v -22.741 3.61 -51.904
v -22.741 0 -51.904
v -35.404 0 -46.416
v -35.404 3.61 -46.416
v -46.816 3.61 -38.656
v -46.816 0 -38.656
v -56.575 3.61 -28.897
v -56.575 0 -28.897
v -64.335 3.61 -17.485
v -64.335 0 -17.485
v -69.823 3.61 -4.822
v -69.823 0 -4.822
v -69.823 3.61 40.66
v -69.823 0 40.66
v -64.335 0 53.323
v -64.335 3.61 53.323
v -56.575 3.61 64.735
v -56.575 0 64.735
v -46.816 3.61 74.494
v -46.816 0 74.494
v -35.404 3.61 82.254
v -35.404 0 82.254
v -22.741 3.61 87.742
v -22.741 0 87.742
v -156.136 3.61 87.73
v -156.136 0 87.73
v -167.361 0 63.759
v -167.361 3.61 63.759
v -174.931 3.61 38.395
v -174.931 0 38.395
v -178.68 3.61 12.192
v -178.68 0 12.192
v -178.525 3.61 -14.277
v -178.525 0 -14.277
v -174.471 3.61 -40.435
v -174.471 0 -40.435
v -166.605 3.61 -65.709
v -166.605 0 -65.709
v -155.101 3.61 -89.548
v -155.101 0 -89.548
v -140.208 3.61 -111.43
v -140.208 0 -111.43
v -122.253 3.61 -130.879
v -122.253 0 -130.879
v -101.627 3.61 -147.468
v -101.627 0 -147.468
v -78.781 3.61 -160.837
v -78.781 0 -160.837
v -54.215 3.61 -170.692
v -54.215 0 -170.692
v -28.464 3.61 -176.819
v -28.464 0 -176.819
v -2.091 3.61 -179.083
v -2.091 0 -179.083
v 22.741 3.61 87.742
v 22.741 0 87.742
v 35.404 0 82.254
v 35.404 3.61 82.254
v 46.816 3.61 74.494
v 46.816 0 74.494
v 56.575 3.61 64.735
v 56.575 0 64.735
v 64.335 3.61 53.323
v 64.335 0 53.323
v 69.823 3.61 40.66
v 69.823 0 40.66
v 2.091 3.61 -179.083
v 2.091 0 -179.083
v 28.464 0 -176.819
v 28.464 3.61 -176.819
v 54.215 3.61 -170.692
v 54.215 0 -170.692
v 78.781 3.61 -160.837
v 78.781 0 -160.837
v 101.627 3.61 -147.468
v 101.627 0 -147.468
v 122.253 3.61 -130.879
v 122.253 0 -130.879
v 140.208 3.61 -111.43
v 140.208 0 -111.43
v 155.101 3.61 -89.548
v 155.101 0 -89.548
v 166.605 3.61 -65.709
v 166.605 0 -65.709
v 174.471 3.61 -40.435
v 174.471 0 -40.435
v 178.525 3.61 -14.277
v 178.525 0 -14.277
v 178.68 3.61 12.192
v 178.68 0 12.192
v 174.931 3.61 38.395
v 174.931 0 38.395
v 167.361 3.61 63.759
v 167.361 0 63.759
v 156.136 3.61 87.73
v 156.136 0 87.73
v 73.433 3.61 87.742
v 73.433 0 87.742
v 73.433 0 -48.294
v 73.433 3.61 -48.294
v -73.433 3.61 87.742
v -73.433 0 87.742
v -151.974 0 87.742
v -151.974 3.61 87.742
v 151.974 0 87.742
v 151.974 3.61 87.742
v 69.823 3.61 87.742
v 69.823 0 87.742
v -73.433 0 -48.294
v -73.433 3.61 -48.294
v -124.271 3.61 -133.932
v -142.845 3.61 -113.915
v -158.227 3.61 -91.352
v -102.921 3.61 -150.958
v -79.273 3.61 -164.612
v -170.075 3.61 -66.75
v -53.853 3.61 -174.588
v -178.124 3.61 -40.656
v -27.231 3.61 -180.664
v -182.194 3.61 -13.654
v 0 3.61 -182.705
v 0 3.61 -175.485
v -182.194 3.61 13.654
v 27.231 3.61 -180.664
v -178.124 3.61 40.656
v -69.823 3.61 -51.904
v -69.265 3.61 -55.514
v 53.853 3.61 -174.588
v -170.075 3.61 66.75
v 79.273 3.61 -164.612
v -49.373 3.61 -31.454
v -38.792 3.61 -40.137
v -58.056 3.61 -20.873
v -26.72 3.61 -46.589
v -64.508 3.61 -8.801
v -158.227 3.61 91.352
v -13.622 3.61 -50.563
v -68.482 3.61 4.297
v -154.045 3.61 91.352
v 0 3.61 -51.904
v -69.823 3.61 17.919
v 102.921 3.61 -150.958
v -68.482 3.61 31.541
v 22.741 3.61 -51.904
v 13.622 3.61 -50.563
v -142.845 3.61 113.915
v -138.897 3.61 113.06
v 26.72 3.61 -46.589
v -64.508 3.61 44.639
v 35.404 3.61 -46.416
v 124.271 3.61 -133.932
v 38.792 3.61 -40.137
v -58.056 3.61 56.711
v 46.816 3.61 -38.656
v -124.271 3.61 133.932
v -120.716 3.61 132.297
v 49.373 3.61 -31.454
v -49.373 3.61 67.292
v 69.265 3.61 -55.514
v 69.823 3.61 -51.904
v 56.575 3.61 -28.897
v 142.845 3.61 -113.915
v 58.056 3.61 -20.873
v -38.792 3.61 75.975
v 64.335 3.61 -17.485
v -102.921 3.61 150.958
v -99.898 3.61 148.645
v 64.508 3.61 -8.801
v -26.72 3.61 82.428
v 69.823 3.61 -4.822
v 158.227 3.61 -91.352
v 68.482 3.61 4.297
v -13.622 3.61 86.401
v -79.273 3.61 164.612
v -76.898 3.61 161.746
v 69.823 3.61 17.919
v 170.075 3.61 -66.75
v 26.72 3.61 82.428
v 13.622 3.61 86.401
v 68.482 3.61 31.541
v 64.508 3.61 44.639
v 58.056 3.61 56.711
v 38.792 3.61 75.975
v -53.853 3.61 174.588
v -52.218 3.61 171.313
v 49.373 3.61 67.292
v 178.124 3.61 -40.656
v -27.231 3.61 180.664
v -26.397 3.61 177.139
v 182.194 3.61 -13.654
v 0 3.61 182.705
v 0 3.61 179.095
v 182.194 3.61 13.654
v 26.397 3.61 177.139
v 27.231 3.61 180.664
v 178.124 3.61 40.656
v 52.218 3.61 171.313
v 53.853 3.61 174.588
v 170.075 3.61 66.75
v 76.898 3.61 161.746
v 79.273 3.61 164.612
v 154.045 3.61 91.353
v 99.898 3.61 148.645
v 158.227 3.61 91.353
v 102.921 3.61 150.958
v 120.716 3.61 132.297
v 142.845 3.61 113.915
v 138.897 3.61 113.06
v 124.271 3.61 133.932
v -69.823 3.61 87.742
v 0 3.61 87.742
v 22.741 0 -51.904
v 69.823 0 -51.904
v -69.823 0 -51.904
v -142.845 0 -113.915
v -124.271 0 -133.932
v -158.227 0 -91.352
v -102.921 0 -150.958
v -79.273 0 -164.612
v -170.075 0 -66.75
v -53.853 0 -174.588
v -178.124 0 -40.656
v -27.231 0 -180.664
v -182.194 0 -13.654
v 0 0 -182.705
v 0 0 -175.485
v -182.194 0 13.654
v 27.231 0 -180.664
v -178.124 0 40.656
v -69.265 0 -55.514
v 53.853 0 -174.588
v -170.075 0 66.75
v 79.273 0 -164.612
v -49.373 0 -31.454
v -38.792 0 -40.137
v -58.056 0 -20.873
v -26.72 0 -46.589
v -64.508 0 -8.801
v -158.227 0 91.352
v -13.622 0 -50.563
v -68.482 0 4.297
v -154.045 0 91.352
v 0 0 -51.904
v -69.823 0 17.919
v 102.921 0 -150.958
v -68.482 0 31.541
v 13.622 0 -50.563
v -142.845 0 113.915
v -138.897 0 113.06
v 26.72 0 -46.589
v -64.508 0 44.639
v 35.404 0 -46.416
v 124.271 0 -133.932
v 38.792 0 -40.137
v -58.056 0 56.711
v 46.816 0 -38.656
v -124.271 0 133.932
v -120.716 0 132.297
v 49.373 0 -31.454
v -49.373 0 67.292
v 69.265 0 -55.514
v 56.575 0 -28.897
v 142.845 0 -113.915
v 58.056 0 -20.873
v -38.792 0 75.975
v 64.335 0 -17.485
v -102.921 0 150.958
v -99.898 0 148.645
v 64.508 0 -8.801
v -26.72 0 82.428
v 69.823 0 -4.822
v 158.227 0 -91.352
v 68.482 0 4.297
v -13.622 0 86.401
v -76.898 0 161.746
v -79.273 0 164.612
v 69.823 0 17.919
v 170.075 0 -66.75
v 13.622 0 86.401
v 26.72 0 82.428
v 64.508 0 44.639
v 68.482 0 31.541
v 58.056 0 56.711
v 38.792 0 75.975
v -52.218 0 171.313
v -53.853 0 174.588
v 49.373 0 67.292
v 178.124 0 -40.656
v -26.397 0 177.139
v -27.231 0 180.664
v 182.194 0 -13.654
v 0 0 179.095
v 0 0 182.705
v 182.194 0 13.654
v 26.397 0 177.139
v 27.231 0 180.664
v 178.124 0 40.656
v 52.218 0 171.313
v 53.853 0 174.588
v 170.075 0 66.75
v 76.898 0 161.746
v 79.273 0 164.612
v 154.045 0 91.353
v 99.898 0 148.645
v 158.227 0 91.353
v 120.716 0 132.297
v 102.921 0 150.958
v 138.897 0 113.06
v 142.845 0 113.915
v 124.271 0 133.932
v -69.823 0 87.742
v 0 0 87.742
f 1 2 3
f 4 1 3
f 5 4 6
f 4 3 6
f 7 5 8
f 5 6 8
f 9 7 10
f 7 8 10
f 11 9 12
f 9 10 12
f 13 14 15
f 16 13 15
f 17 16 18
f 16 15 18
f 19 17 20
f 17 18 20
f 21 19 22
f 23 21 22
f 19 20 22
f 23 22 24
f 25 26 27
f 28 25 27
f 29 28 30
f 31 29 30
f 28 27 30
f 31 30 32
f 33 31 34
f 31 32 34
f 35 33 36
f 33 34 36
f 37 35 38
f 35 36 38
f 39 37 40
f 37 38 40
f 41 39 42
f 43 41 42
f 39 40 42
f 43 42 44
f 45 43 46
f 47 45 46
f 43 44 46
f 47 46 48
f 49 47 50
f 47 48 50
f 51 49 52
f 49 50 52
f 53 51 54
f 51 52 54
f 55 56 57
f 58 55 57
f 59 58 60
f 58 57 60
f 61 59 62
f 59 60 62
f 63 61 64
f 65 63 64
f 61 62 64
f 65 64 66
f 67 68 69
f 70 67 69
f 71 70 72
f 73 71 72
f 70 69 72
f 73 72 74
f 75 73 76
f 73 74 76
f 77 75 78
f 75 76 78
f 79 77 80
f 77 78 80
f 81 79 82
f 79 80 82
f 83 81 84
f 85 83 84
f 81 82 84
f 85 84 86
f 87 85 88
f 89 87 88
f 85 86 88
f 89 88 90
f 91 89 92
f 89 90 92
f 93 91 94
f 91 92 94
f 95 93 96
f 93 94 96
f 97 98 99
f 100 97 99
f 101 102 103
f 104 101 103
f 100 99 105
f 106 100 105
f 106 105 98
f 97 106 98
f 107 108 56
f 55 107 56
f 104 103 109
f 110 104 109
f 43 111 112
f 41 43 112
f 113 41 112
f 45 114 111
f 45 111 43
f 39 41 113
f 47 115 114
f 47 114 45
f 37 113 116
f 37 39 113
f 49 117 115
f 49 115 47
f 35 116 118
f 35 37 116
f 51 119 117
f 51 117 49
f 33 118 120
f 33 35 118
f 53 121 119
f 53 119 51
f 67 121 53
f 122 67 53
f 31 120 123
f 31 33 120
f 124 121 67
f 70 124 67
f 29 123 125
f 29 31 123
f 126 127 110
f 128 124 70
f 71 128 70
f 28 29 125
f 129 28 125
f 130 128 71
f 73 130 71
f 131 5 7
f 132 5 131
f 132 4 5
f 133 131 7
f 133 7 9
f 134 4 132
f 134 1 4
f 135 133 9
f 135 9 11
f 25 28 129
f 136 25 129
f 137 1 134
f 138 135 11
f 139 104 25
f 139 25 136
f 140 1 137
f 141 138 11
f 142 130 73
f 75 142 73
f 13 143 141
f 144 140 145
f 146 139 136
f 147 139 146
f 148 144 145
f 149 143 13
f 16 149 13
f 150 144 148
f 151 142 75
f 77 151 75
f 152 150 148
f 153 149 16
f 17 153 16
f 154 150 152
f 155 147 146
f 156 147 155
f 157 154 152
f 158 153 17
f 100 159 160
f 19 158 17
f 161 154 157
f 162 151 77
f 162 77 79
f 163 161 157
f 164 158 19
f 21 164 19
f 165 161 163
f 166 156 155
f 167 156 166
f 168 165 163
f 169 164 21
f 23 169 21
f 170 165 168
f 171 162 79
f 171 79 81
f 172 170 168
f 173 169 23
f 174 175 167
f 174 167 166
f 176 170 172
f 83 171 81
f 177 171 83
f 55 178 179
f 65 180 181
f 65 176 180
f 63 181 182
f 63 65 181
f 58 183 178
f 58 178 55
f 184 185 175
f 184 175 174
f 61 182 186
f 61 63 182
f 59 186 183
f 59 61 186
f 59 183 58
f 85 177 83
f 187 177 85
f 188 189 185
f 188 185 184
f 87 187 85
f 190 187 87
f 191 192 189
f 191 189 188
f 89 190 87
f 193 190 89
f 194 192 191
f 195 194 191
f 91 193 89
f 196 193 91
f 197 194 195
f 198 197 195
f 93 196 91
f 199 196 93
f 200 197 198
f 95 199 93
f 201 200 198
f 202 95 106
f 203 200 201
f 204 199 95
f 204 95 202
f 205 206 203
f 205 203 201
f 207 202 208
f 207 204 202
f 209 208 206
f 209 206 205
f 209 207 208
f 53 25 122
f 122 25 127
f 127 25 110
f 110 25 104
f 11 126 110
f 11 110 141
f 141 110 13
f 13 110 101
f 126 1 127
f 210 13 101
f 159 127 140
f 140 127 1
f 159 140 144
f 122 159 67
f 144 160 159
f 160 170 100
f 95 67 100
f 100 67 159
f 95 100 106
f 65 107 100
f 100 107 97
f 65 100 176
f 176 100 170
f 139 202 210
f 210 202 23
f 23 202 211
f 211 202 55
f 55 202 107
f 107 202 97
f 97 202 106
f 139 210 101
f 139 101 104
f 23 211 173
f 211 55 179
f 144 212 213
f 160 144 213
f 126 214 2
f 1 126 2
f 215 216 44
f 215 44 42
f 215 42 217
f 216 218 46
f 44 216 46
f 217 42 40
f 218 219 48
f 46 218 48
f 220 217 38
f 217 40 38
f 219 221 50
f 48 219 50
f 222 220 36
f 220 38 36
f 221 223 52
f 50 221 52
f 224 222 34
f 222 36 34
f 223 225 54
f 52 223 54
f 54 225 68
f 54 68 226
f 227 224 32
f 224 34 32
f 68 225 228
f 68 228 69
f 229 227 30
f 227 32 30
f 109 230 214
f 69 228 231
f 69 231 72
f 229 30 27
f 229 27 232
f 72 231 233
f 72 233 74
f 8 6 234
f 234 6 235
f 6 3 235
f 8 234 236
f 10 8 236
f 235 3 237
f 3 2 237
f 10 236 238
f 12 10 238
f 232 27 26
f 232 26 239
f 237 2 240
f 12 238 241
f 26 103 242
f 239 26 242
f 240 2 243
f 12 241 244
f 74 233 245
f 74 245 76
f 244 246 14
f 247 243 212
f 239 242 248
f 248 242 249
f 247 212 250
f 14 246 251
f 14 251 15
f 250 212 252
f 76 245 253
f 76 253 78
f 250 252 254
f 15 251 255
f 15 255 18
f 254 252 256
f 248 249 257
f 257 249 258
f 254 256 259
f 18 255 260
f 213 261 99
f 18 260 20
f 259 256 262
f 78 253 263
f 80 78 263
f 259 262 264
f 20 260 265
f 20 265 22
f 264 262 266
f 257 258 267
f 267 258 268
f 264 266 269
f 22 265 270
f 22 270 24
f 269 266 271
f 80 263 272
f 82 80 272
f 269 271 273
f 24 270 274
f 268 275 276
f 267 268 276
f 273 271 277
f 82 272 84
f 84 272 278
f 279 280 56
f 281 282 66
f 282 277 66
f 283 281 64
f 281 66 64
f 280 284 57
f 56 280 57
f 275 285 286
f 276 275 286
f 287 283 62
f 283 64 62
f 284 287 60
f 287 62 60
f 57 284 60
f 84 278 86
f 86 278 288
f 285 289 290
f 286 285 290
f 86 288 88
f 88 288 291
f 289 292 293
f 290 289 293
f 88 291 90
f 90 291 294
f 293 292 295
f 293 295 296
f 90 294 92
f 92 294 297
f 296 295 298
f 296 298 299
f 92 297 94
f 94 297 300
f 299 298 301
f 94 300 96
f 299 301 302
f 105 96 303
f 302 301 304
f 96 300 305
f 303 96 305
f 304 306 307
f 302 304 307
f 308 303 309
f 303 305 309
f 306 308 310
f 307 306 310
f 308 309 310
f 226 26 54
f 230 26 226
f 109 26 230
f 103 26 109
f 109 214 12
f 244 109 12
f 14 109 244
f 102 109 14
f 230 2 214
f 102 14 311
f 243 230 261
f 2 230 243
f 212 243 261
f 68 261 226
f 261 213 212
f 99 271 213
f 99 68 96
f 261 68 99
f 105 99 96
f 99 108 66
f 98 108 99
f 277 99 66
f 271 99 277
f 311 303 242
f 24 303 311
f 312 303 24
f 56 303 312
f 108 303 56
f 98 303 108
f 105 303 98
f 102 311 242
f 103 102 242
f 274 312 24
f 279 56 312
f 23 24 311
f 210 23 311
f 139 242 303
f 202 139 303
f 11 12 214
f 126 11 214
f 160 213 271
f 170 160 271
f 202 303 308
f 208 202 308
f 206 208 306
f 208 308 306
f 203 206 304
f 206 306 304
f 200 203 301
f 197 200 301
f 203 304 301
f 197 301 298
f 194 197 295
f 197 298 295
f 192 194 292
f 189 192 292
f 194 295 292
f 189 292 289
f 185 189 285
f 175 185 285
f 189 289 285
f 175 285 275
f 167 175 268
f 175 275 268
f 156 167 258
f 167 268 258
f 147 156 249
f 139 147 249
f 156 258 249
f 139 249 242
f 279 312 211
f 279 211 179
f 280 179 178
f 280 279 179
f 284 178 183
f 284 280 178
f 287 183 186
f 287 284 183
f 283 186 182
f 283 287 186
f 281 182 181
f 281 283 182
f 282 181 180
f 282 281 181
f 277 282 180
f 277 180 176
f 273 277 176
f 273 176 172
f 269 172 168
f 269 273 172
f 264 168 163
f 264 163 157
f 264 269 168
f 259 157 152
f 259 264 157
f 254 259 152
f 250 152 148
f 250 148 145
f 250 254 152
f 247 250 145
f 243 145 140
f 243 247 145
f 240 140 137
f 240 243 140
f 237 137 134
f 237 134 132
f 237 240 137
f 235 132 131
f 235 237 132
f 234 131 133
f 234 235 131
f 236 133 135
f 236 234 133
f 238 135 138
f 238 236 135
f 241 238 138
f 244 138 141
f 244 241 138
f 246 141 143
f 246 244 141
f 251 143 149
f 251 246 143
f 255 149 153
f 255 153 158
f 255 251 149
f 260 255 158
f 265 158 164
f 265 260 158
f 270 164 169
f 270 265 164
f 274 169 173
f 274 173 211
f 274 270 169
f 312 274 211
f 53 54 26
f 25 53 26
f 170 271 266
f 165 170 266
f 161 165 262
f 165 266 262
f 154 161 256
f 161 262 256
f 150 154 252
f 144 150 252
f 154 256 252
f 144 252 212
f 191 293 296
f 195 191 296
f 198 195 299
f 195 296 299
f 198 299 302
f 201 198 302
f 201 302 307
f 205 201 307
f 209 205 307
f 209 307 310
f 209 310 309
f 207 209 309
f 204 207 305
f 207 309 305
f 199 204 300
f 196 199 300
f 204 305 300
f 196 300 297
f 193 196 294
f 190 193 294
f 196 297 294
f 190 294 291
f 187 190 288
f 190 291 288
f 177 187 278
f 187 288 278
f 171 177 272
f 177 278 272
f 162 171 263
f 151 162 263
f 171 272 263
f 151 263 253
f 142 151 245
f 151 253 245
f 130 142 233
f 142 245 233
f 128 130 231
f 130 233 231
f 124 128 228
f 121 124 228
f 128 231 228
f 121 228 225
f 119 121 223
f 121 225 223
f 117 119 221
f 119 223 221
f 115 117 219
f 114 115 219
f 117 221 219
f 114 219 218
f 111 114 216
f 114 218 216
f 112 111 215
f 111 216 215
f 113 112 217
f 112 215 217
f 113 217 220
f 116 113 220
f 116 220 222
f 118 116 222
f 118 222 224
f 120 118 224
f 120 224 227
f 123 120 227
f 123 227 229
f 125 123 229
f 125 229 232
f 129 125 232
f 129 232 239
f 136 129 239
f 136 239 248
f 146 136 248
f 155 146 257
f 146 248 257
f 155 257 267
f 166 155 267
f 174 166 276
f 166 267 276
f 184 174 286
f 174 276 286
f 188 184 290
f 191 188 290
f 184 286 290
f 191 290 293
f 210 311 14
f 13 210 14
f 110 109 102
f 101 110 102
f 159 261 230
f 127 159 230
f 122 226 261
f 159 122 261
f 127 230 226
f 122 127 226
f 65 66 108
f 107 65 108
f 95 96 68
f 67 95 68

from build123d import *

# Parameters (mm, degrees)
SKETCH1_R           = 182.705
SKETCH1_R_2         = 69.823485805
BOSS_EXTRUDE4_DEPTH = 3.61


with BuildPart() as part:
    # Sketch1 → Boss-Extrude4 (new body)
    with BuildSketch(Plane(origin=(0, 0, 0), x_dir=(1, 0, 0), z_dir=(0, 1, 0))):
        with Locations(Location((0, 0, 0), (0, 0, 270))):
            Circle(SKETCH1_R)
        Polygon((-73.433485805, -87.7425), (-151.974467983, -87.7425), (-73.433485805, 48.294471609), align=None, mode=Mode.SUBTRACT)
        with BuildLine():
            Line((-22.741100842, -87.7425), (-69.823485805, -87.7425))
            Line((-69.823485805, -87.7425), (-69.823485805, -40.660115037))
            ThreePointArc((-69.823485805, -40.660115037), (-51.925315779, -69.844329974), (-22.741100842, -87.7425))
        make_face(mode=Mode.SUBTRACT)
        with Locations(Location((0, -17.919014195, 0), (0, 0, 270))):
            Circle(SKETCH1_R_2, mode=Mode.SUBTRACT)
        with BuildLine():
            ThreePointArc((154.04460318, -91.3525), (0, -179.095), (-154.04460318, -91.3525))
            Line((-154.04460318, -91.3525), (-73.433485805, -91.3525))
            Line((-73.433485805, -91.3525), (73.433485805, -91.3525))
            Line((73.433485805, -91.3525), (154.04460318, -91.3525))
        make_face(mode=Mode.SUBTRACT)
        with BuildLine():
            Line((69.823485805, -40.660115037), (69.823485805, -87.7425))
            Line((69.823485805, -87.7425), (22.741100842, -87.7425))
            ThreePointArc((22.741100842, -87.7425), (51.925315779, -69.844329974), (69.823485805, -40.660115037))
        make_face(mode=Mode.SUBTRACT)
        Polygon((151.974467983, -87.7425), (73.433485805, -87.7425), (73.433485805, 48.294471609), align=None, mode=Mode.SUBTRACT)
        with BuildLine():
            Line((-69.823485805, 51.904471609), (-22.741100842, 51.904471609))
            ThreePointArc((-22.741100842, 51.904471609), (-51.925315779, 34.006301583), (-69.823485805, 4.822086647))
            Line((-69.823485805, 4.822086647), (-69.823485805, 51.904471609))
        make_face(mode=Mode.SUBTRACT)
        with BuildLine():
            ThreePointArc((-156.135887289, -87.730289669), (-155.100819691, 89.5475), (-2.091284109, 179.082789669))
            Line((-2.091284109, 179.082789669), (-156.135887289, -87.730289669))
        make_face(mode=Mode.SUBTRACT)
        Polygon((-69.265016861, 55.514471609), (0, 175.485), (69.265016861, 55.514471609), align=None, mode=Mode.SUBTRACT)
        with BuildLine():
            Line((22.741100842, 51.904471609), (69.823485805, 51.904471609))
            Line((69.823485805, 51.904471609), (69.823485805, 4.822086647))
            ThreePointArc((69.823485805, 4.822086647), (51.925315779, 34.006301583), (22.741100842, 51.904471609))
        make_face(mode=Mode.SUBTRACT)
        with BuildLine():
            ThreePointArc((2.091284109, 179.082789669), (155.100819691, 89.5475), (156.135887289, -87.730289669))
            Line((156.135887289, -87.730289669), (2.091284109, 179.082789669))
        make_face(mode=Mode.SUBTRACT)
    extrude(amount=BOSS_EXTRUDE4_DEPTH)


solid = part.part
